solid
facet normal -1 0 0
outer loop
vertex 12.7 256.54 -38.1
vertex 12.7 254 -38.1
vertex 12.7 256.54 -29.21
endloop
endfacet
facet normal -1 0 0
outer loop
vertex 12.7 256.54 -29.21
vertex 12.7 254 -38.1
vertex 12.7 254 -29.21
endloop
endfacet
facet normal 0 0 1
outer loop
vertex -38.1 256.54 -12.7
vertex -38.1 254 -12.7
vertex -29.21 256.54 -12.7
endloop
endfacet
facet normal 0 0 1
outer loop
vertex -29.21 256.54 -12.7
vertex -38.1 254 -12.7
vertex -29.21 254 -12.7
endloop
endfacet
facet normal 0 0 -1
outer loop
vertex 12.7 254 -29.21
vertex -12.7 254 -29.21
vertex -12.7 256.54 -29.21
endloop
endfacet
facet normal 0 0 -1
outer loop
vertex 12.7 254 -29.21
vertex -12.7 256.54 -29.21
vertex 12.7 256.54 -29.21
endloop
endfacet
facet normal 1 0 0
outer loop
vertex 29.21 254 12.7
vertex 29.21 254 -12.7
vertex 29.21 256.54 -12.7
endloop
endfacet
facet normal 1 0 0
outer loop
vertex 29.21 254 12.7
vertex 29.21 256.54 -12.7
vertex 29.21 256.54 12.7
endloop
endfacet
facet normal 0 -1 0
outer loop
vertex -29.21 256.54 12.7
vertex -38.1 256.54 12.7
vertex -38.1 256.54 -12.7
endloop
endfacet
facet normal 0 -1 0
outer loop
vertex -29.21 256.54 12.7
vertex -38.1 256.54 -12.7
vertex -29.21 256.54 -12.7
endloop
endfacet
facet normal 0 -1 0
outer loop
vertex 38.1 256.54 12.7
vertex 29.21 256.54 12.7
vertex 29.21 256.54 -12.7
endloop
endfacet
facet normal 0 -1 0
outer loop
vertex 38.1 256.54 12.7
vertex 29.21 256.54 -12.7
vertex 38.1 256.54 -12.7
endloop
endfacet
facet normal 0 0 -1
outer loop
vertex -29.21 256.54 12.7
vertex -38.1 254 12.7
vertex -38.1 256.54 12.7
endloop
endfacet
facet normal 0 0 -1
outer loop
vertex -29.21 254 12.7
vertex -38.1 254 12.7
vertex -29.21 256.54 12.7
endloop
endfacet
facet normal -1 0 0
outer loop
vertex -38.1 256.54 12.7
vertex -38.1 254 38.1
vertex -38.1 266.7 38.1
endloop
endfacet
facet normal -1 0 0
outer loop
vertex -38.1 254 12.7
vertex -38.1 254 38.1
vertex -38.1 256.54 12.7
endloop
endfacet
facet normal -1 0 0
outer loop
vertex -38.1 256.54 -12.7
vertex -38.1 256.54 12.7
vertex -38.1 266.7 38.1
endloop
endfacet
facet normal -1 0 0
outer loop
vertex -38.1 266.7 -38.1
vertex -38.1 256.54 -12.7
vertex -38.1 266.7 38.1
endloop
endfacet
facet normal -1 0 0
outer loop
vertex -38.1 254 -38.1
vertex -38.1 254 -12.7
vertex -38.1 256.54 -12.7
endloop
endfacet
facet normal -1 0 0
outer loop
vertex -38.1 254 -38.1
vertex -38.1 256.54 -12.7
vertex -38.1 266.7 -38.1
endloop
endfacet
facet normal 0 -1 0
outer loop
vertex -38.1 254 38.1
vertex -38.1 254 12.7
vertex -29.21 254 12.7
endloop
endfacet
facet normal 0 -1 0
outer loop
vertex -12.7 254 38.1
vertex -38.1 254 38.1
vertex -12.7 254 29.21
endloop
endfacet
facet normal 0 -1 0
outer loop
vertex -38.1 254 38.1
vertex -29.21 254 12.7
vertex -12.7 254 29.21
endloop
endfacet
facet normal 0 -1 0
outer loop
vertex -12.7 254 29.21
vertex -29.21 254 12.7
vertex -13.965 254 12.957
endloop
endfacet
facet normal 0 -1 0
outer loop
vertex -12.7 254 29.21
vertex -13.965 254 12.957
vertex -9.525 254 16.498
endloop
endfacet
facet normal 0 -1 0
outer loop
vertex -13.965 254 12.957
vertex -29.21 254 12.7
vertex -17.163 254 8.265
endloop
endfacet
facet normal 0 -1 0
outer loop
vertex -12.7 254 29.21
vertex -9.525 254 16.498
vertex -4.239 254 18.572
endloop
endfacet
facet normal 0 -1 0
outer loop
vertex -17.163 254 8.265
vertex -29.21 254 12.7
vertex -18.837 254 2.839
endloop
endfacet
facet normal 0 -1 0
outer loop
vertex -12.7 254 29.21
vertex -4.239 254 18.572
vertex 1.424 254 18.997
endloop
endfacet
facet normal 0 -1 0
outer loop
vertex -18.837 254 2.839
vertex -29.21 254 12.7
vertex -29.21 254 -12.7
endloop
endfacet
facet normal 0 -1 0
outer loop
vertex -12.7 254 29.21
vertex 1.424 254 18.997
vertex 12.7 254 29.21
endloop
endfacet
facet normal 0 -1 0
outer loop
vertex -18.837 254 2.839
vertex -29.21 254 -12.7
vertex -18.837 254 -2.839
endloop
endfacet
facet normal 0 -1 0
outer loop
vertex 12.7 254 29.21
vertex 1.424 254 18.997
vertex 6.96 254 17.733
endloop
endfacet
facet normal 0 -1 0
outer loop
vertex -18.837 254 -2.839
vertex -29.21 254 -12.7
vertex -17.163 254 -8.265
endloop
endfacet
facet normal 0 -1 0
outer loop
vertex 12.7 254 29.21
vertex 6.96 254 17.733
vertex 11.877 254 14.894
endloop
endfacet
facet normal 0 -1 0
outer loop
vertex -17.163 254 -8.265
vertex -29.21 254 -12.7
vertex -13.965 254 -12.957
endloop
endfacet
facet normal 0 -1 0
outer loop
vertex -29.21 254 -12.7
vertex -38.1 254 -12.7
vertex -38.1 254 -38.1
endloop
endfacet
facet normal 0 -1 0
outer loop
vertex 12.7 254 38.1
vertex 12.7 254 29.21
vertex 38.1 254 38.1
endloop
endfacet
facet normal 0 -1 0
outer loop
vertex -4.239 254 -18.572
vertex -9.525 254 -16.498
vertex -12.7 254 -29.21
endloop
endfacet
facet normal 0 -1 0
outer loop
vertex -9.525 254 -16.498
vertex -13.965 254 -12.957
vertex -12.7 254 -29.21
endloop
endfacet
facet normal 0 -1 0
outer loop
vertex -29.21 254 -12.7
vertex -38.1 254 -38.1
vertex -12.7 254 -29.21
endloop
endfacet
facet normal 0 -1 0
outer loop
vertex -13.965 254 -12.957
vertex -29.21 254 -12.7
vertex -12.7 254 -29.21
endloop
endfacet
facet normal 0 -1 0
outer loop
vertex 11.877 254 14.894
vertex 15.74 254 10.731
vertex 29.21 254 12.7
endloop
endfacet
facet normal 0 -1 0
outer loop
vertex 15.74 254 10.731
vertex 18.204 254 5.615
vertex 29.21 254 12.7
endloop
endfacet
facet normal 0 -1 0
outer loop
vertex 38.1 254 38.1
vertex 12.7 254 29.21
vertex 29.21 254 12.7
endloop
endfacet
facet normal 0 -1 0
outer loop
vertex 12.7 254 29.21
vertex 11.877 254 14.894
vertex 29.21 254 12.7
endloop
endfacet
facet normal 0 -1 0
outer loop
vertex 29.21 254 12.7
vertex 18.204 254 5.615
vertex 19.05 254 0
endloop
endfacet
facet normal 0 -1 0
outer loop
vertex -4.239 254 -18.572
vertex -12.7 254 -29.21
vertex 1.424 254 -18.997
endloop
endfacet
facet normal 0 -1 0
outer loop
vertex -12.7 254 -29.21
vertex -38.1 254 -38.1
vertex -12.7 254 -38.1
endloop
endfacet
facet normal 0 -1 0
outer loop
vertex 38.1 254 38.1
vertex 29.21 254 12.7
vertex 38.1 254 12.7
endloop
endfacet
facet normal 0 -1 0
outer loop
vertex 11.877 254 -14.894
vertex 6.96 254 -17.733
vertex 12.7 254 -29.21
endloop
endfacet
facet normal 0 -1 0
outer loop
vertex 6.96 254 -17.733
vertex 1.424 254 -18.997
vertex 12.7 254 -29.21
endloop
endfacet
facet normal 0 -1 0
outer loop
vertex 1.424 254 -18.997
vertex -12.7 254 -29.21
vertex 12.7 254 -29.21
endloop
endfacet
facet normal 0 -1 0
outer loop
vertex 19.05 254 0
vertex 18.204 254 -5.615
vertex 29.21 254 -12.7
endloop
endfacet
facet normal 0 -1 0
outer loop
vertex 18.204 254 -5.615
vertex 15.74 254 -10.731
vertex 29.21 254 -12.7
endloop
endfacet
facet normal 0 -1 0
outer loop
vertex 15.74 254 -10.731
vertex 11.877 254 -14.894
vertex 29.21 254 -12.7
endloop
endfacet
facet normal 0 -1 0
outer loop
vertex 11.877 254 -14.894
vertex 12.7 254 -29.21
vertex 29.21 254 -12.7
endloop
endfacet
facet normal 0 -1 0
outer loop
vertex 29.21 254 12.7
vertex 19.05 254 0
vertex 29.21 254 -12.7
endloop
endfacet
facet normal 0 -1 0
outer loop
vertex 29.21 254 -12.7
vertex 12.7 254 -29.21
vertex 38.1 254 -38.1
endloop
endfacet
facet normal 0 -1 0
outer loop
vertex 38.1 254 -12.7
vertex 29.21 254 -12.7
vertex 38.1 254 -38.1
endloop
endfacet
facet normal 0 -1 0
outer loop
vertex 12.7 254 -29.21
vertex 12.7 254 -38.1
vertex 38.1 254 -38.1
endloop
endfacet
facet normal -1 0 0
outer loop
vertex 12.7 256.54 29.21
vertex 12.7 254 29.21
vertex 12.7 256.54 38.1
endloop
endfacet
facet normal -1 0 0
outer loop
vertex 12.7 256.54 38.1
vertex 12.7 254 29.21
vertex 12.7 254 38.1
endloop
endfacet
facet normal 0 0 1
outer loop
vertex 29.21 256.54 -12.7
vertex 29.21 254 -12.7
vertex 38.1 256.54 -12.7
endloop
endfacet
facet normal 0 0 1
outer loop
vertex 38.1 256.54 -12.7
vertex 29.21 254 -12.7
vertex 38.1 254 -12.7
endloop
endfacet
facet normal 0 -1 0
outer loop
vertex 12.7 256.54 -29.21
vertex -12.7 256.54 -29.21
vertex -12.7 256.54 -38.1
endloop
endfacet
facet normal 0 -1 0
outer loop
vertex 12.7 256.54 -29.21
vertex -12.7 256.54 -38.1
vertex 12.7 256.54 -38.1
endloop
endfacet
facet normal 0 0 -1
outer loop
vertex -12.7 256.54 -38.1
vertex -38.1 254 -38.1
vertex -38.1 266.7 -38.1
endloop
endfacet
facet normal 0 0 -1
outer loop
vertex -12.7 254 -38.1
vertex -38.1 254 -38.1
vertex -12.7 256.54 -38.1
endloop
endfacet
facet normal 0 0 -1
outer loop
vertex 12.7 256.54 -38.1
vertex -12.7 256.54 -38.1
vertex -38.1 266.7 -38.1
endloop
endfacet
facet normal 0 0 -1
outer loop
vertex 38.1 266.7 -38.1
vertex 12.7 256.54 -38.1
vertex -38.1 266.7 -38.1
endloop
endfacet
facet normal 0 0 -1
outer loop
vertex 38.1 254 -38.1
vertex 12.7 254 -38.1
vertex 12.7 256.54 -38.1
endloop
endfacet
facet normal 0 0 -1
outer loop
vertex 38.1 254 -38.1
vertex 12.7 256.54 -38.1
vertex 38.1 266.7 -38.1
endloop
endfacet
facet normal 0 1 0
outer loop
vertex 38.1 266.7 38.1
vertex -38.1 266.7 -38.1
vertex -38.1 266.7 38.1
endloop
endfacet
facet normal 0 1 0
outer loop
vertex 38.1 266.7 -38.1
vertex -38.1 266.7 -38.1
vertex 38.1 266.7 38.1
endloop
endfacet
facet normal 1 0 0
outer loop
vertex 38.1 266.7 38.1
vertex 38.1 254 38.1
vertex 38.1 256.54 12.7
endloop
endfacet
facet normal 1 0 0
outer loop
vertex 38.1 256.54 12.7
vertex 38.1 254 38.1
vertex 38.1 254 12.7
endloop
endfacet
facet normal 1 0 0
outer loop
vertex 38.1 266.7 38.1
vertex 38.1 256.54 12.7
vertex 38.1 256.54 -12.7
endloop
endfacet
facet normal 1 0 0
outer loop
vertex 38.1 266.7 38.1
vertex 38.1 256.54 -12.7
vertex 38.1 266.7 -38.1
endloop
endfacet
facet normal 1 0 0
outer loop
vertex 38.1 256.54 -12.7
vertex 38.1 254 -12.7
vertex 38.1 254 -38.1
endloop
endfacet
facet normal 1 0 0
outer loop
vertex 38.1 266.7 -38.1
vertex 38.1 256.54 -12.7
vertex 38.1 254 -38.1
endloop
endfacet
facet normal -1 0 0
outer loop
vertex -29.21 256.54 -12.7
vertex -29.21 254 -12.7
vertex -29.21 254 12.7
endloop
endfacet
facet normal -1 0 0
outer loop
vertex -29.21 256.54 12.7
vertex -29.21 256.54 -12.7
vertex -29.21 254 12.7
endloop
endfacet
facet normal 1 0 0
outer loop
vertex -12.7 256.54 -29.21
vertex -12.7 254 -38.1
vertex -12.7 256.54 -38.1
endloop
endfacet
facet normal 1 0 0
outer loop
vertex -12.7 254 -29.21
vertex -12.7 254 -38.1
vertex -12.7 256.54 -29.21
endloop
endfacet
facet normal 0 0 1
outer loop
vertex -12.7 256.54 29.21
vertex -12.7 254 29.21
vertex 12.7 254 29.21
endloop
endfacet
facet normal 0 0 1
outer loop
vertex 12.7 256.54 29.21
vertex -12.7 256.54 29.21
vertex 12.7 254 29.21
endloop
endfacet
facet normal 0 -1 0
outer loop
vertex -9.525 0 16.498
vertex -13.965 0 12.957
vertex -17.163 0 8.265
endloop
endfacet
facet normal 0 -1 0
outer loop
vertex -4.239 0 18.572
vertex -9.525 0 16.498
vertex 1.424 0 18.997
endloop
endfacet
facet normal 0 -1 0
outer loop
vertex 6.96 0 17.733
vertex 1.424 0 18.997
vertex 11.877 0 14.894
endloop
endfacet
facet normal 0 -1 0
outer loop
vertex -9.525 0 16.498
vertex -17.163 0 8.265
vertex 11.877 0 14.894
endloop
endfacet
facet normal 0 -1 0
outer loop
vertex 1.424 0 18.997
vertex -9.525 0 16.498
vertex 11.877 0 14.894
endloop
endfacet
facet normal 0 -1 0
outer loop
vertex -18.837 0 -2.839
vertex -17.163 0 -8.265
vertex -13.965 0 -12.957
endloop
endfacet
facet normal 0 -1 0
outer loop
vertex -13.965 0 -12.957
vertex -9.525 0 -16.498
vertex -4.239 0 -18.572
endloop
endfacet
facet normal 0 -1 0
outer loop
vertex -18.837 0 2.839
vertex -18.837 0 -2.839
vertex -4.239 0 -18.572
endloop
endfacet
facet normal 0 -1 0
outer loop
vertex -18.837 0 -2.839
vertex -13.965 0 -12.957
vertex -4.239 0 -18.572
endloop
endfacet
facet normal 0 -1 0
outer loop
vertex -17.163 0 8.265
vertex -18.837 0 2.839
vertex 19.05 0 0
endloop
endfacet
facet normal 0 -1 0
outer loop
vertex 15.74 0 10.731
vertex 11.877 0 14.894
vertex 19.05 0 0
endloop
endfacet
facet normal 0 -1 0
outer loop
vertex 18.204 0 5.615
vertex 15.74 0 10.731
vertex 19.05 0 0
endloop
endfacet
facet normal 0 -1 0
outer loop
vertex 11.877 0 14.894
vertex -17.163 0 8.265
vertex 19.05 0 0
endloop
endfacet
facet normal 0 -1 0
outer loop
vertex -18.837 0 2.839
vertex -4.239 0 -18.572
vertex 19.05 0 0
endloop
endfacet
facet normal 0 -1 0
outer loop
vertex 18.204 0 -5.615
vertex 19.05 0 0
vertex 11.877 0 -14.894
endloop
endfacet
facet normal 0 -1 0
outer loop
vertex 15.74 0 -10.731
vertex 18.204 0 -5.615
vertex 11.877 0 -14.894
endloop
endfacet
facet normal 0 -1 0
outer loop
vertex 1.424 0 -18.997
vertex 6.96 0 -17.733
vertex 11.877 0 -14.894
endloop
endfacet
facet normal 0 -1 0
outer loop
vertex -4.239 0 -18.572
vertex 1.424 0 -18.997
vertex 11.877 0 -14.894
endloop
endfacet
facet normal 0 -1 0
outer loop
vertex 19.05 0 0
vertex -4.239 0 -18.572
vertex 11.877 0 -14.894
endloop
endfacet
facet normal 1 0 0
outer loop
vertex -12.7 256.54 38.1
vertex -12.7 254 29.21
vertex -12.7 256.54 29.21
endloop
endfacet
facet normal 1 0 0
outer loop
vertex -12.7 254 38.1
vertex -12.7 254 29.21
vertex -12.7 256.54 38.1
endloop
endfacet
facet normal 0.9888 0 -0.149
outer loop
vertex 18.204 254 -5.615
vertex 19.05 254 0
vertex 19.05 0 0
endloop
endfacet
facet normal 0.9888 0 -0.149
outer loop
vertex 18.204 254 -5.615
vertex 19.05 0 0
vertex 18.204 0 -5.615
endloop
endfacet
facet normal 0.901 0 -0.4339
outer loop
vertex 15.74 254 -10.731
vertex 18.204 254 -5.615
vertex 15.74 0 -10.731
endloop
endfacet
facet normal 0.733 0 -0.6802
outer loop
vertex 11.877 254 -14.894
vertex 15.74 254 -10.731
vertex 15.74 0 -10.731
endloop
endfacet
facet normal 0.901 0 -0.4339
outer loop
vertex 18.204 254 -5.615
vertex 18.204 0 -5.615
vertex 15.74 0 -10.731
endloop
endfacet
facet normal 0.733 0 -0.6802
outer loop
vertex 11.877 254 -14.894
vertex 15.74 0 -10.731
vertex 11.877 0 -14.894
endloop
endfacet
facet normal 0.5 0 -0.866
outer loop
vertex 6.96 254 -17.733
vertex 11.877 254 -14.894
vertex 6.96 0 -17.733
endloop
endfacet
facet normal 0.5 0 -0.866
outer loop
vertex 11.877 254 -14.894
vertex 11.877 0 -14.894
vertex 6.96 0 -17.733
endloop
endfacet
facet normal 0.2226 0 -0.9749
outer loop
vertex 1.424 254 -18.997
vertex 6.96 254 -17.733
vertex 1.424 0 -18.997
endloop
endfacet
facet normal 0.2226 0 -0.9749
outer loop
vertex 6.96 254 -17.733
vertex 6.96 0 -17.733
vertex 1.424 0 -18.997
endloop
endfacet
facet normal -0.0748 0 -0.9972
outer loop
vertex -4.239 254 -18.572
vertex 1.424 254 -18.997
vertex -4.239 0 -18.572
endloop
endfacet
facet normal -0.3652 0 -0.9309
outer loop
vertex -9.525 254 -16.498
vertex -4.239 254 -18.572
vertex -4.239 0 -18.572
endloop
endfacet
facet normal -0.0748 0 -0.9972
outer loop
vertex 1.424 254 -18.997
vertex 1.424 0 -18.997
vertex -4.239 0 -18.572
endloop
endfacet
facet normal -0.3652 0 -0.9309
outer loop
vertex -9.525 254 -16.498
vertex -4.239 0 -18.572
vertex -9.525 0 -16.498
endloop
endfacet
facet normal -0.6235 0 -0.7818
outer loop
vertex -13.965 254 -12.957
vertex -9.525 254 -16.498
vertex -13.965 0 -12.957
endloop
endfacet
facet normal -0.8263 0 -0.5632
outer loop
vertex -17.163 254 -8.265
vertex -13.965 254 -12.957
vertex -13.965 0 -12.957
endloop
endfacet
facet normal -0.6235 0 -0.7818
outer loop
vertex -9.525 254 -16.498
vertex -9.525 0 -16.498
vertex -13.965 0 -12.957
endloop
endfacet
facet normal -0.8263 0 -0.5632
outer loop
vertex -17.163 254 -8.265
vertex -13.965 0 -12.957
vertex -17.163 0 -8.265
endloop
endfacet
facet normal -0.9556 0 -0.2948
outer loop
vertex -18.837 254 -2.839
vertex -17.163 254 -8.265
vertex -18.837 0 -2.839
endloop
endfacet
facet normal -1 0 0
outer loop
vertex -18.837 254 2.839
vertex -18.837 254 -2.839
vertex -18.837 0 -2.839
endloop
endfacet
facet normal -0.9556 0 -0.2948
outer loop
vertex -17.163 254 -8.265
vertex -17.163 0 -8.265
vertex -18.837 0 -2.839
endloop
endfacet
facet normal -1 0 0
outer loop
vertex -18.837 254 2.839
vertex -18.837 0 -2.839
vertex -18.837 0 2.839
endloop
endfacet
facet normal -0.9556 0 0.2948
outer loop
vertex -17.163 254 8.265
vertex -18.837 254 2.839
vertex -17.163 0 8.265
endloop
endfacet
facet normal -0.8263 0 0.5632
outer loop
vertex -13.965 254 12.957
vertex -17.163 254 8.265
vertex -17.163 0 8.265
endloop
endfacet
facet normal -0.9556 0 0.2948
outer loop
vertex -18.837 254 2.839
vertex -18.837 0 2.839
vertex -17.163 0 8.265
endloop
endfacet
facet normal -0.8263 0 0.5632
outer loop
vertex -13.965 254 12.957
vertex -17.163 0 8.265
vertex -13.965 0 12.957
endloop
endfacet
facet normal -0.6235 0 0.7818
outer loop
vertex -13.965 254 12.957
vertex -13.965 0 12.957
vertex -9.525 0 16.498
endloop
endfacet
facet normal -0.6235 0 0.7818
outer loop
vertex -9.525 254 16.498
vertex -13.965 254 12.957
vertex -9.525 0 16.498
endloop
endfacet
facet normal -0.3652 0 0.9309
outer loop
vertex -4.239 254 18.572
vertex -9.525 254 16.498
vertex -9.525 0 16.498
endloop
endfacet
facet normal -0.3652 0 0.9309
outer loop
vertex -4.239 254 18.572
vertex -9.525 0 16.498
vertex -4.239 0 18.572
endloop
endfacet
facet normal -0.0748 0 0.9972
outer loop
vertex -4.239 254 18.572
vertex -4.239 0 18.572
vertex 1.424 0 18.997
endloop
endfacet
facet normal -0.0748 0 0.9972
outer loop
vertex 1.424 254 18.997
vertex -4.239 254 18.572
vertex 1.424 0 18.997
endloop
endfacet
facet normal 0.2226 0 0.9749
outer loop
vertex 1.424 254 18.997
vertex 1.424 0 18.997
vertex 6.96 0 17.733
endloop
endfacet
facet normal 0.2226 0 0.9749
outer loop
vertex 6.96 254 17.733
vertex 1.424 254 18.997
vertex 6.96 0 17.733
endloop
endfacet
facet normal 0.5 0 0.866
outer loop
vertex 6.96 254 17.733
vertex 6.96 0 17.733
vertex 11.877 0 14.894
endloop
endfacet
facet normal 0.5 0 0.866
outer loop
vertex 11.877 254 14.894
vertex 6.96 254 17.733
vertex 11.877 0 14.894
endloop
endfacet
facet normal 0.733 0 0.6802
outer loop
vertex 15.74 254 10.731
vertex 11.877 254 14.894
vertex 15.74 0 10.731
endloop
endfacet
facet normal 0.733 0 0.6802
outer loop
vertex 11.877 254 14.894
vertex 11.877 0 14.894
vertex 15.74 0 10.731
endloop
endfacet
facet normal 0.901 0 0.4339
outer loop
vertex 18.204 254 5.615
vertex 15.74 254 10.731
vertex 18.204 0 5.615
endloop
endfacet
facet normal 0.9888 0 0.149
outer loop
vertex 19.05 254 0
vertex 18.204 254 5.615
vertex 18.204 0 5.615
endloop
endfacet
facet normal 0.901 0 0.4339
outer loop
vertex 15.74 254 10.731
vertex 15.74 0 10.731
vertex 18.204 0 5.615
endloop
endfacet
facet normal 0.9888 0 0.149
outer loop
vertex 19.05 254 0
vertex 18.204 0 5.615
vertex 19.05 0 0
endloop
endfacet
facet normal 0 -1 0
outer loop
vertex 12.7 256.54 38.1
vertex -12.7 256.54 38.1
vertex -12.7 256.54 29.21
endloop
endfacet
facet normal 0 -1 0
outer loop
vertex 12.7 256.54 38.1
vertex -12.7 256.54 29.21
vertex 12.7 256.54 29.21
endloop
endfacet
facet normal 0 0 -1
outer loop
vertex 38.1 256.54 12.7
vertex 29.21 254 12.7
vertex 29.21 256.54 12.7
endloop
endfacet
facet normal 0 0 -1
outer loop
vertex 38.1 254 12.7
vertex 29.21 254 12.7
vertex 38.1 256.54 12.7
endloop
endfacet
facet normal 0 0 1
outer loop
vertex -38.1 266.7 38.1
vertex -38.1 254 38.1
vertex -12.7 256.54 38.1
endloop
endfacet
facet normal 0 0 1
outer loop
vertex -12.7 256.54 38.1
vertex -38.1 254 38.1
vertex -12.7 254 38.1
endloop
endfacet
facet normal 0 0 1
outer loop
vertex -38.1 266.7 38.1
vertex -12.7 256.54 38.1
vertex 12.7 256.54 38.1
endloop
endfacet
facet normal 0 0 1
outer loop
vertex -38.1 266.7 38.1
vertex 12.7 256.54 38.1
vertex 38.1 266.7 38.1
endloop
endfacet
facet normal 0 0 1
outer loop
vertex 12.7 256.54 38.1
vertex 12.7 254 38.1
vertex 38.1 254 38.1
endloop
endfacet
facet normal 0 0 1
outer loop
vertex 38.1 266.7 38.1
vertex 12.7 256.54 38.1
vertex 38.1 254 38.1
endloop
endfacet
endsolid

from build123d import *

# Parameters (mm, degrees)
SKETCH1_R           = 19.05
BOSS_EXTRUDE1_DEPTH = 254
SKETCH5_W           = 76.2
SKETCH5_H           = 76.2
BOSS_EXTRUDE3_DEPTH = 12.7
SKETCH6_W           = 8.89
SKETCH6_H           = 25.4
SKETCH6_W_2         = 25.4
SKETCH6_H_2         = 8.89
CUT_EXTRUDE1_DEPTH  = 2.54


with BuildPart() as part:
    # Sketch1 → Boss-Extrude1 (new body)
    with BuildSketch(Plane(origin=(0, 0, 0), x_dir=(1, 0, 0), z_dir=(0, 1, 0))):
        Circle(SKETCH1_R)
    extrude(amount=BOSS_EXTRUDE1_DEPTH)

    # Sketch5 → Boss-Extrude3 (add)
    with BuildSketch(Plane(origin=(0, 254, 0), x_dir=(1, 0, 0), z_dir=(0, 1, 0))):
        Rectangle(SKETCH5_W, SKETCH5_H)
    extrude(amount=BOSS_EXTRUDE3_DEPTH)

    # Sketch6 → Cut-Extrude1 (cut)
    with BuildSketch(Plane.XZ.offset(-254)):
        with Locations((-33.655, 0)):
            Rectangle(SKETCH6_W, SKETCH6_H)
        with Locations((0, 33.655)):
            Rectangle(SKETCH6_W_2, SKETCH6_H_2)
        with Locations((33.655, 0)):
            Rectangle(SKETCH6_W, SKETCH6_H)
        with Locations((0, -33.655)):
            Rectangle(SKETCH6_W_2, SKETCH6_H_2)
    extrude(amount=-CUT_EXTRUDE1_DEPTH, mode=Mode.SUBTRACT)


solid = part.part
